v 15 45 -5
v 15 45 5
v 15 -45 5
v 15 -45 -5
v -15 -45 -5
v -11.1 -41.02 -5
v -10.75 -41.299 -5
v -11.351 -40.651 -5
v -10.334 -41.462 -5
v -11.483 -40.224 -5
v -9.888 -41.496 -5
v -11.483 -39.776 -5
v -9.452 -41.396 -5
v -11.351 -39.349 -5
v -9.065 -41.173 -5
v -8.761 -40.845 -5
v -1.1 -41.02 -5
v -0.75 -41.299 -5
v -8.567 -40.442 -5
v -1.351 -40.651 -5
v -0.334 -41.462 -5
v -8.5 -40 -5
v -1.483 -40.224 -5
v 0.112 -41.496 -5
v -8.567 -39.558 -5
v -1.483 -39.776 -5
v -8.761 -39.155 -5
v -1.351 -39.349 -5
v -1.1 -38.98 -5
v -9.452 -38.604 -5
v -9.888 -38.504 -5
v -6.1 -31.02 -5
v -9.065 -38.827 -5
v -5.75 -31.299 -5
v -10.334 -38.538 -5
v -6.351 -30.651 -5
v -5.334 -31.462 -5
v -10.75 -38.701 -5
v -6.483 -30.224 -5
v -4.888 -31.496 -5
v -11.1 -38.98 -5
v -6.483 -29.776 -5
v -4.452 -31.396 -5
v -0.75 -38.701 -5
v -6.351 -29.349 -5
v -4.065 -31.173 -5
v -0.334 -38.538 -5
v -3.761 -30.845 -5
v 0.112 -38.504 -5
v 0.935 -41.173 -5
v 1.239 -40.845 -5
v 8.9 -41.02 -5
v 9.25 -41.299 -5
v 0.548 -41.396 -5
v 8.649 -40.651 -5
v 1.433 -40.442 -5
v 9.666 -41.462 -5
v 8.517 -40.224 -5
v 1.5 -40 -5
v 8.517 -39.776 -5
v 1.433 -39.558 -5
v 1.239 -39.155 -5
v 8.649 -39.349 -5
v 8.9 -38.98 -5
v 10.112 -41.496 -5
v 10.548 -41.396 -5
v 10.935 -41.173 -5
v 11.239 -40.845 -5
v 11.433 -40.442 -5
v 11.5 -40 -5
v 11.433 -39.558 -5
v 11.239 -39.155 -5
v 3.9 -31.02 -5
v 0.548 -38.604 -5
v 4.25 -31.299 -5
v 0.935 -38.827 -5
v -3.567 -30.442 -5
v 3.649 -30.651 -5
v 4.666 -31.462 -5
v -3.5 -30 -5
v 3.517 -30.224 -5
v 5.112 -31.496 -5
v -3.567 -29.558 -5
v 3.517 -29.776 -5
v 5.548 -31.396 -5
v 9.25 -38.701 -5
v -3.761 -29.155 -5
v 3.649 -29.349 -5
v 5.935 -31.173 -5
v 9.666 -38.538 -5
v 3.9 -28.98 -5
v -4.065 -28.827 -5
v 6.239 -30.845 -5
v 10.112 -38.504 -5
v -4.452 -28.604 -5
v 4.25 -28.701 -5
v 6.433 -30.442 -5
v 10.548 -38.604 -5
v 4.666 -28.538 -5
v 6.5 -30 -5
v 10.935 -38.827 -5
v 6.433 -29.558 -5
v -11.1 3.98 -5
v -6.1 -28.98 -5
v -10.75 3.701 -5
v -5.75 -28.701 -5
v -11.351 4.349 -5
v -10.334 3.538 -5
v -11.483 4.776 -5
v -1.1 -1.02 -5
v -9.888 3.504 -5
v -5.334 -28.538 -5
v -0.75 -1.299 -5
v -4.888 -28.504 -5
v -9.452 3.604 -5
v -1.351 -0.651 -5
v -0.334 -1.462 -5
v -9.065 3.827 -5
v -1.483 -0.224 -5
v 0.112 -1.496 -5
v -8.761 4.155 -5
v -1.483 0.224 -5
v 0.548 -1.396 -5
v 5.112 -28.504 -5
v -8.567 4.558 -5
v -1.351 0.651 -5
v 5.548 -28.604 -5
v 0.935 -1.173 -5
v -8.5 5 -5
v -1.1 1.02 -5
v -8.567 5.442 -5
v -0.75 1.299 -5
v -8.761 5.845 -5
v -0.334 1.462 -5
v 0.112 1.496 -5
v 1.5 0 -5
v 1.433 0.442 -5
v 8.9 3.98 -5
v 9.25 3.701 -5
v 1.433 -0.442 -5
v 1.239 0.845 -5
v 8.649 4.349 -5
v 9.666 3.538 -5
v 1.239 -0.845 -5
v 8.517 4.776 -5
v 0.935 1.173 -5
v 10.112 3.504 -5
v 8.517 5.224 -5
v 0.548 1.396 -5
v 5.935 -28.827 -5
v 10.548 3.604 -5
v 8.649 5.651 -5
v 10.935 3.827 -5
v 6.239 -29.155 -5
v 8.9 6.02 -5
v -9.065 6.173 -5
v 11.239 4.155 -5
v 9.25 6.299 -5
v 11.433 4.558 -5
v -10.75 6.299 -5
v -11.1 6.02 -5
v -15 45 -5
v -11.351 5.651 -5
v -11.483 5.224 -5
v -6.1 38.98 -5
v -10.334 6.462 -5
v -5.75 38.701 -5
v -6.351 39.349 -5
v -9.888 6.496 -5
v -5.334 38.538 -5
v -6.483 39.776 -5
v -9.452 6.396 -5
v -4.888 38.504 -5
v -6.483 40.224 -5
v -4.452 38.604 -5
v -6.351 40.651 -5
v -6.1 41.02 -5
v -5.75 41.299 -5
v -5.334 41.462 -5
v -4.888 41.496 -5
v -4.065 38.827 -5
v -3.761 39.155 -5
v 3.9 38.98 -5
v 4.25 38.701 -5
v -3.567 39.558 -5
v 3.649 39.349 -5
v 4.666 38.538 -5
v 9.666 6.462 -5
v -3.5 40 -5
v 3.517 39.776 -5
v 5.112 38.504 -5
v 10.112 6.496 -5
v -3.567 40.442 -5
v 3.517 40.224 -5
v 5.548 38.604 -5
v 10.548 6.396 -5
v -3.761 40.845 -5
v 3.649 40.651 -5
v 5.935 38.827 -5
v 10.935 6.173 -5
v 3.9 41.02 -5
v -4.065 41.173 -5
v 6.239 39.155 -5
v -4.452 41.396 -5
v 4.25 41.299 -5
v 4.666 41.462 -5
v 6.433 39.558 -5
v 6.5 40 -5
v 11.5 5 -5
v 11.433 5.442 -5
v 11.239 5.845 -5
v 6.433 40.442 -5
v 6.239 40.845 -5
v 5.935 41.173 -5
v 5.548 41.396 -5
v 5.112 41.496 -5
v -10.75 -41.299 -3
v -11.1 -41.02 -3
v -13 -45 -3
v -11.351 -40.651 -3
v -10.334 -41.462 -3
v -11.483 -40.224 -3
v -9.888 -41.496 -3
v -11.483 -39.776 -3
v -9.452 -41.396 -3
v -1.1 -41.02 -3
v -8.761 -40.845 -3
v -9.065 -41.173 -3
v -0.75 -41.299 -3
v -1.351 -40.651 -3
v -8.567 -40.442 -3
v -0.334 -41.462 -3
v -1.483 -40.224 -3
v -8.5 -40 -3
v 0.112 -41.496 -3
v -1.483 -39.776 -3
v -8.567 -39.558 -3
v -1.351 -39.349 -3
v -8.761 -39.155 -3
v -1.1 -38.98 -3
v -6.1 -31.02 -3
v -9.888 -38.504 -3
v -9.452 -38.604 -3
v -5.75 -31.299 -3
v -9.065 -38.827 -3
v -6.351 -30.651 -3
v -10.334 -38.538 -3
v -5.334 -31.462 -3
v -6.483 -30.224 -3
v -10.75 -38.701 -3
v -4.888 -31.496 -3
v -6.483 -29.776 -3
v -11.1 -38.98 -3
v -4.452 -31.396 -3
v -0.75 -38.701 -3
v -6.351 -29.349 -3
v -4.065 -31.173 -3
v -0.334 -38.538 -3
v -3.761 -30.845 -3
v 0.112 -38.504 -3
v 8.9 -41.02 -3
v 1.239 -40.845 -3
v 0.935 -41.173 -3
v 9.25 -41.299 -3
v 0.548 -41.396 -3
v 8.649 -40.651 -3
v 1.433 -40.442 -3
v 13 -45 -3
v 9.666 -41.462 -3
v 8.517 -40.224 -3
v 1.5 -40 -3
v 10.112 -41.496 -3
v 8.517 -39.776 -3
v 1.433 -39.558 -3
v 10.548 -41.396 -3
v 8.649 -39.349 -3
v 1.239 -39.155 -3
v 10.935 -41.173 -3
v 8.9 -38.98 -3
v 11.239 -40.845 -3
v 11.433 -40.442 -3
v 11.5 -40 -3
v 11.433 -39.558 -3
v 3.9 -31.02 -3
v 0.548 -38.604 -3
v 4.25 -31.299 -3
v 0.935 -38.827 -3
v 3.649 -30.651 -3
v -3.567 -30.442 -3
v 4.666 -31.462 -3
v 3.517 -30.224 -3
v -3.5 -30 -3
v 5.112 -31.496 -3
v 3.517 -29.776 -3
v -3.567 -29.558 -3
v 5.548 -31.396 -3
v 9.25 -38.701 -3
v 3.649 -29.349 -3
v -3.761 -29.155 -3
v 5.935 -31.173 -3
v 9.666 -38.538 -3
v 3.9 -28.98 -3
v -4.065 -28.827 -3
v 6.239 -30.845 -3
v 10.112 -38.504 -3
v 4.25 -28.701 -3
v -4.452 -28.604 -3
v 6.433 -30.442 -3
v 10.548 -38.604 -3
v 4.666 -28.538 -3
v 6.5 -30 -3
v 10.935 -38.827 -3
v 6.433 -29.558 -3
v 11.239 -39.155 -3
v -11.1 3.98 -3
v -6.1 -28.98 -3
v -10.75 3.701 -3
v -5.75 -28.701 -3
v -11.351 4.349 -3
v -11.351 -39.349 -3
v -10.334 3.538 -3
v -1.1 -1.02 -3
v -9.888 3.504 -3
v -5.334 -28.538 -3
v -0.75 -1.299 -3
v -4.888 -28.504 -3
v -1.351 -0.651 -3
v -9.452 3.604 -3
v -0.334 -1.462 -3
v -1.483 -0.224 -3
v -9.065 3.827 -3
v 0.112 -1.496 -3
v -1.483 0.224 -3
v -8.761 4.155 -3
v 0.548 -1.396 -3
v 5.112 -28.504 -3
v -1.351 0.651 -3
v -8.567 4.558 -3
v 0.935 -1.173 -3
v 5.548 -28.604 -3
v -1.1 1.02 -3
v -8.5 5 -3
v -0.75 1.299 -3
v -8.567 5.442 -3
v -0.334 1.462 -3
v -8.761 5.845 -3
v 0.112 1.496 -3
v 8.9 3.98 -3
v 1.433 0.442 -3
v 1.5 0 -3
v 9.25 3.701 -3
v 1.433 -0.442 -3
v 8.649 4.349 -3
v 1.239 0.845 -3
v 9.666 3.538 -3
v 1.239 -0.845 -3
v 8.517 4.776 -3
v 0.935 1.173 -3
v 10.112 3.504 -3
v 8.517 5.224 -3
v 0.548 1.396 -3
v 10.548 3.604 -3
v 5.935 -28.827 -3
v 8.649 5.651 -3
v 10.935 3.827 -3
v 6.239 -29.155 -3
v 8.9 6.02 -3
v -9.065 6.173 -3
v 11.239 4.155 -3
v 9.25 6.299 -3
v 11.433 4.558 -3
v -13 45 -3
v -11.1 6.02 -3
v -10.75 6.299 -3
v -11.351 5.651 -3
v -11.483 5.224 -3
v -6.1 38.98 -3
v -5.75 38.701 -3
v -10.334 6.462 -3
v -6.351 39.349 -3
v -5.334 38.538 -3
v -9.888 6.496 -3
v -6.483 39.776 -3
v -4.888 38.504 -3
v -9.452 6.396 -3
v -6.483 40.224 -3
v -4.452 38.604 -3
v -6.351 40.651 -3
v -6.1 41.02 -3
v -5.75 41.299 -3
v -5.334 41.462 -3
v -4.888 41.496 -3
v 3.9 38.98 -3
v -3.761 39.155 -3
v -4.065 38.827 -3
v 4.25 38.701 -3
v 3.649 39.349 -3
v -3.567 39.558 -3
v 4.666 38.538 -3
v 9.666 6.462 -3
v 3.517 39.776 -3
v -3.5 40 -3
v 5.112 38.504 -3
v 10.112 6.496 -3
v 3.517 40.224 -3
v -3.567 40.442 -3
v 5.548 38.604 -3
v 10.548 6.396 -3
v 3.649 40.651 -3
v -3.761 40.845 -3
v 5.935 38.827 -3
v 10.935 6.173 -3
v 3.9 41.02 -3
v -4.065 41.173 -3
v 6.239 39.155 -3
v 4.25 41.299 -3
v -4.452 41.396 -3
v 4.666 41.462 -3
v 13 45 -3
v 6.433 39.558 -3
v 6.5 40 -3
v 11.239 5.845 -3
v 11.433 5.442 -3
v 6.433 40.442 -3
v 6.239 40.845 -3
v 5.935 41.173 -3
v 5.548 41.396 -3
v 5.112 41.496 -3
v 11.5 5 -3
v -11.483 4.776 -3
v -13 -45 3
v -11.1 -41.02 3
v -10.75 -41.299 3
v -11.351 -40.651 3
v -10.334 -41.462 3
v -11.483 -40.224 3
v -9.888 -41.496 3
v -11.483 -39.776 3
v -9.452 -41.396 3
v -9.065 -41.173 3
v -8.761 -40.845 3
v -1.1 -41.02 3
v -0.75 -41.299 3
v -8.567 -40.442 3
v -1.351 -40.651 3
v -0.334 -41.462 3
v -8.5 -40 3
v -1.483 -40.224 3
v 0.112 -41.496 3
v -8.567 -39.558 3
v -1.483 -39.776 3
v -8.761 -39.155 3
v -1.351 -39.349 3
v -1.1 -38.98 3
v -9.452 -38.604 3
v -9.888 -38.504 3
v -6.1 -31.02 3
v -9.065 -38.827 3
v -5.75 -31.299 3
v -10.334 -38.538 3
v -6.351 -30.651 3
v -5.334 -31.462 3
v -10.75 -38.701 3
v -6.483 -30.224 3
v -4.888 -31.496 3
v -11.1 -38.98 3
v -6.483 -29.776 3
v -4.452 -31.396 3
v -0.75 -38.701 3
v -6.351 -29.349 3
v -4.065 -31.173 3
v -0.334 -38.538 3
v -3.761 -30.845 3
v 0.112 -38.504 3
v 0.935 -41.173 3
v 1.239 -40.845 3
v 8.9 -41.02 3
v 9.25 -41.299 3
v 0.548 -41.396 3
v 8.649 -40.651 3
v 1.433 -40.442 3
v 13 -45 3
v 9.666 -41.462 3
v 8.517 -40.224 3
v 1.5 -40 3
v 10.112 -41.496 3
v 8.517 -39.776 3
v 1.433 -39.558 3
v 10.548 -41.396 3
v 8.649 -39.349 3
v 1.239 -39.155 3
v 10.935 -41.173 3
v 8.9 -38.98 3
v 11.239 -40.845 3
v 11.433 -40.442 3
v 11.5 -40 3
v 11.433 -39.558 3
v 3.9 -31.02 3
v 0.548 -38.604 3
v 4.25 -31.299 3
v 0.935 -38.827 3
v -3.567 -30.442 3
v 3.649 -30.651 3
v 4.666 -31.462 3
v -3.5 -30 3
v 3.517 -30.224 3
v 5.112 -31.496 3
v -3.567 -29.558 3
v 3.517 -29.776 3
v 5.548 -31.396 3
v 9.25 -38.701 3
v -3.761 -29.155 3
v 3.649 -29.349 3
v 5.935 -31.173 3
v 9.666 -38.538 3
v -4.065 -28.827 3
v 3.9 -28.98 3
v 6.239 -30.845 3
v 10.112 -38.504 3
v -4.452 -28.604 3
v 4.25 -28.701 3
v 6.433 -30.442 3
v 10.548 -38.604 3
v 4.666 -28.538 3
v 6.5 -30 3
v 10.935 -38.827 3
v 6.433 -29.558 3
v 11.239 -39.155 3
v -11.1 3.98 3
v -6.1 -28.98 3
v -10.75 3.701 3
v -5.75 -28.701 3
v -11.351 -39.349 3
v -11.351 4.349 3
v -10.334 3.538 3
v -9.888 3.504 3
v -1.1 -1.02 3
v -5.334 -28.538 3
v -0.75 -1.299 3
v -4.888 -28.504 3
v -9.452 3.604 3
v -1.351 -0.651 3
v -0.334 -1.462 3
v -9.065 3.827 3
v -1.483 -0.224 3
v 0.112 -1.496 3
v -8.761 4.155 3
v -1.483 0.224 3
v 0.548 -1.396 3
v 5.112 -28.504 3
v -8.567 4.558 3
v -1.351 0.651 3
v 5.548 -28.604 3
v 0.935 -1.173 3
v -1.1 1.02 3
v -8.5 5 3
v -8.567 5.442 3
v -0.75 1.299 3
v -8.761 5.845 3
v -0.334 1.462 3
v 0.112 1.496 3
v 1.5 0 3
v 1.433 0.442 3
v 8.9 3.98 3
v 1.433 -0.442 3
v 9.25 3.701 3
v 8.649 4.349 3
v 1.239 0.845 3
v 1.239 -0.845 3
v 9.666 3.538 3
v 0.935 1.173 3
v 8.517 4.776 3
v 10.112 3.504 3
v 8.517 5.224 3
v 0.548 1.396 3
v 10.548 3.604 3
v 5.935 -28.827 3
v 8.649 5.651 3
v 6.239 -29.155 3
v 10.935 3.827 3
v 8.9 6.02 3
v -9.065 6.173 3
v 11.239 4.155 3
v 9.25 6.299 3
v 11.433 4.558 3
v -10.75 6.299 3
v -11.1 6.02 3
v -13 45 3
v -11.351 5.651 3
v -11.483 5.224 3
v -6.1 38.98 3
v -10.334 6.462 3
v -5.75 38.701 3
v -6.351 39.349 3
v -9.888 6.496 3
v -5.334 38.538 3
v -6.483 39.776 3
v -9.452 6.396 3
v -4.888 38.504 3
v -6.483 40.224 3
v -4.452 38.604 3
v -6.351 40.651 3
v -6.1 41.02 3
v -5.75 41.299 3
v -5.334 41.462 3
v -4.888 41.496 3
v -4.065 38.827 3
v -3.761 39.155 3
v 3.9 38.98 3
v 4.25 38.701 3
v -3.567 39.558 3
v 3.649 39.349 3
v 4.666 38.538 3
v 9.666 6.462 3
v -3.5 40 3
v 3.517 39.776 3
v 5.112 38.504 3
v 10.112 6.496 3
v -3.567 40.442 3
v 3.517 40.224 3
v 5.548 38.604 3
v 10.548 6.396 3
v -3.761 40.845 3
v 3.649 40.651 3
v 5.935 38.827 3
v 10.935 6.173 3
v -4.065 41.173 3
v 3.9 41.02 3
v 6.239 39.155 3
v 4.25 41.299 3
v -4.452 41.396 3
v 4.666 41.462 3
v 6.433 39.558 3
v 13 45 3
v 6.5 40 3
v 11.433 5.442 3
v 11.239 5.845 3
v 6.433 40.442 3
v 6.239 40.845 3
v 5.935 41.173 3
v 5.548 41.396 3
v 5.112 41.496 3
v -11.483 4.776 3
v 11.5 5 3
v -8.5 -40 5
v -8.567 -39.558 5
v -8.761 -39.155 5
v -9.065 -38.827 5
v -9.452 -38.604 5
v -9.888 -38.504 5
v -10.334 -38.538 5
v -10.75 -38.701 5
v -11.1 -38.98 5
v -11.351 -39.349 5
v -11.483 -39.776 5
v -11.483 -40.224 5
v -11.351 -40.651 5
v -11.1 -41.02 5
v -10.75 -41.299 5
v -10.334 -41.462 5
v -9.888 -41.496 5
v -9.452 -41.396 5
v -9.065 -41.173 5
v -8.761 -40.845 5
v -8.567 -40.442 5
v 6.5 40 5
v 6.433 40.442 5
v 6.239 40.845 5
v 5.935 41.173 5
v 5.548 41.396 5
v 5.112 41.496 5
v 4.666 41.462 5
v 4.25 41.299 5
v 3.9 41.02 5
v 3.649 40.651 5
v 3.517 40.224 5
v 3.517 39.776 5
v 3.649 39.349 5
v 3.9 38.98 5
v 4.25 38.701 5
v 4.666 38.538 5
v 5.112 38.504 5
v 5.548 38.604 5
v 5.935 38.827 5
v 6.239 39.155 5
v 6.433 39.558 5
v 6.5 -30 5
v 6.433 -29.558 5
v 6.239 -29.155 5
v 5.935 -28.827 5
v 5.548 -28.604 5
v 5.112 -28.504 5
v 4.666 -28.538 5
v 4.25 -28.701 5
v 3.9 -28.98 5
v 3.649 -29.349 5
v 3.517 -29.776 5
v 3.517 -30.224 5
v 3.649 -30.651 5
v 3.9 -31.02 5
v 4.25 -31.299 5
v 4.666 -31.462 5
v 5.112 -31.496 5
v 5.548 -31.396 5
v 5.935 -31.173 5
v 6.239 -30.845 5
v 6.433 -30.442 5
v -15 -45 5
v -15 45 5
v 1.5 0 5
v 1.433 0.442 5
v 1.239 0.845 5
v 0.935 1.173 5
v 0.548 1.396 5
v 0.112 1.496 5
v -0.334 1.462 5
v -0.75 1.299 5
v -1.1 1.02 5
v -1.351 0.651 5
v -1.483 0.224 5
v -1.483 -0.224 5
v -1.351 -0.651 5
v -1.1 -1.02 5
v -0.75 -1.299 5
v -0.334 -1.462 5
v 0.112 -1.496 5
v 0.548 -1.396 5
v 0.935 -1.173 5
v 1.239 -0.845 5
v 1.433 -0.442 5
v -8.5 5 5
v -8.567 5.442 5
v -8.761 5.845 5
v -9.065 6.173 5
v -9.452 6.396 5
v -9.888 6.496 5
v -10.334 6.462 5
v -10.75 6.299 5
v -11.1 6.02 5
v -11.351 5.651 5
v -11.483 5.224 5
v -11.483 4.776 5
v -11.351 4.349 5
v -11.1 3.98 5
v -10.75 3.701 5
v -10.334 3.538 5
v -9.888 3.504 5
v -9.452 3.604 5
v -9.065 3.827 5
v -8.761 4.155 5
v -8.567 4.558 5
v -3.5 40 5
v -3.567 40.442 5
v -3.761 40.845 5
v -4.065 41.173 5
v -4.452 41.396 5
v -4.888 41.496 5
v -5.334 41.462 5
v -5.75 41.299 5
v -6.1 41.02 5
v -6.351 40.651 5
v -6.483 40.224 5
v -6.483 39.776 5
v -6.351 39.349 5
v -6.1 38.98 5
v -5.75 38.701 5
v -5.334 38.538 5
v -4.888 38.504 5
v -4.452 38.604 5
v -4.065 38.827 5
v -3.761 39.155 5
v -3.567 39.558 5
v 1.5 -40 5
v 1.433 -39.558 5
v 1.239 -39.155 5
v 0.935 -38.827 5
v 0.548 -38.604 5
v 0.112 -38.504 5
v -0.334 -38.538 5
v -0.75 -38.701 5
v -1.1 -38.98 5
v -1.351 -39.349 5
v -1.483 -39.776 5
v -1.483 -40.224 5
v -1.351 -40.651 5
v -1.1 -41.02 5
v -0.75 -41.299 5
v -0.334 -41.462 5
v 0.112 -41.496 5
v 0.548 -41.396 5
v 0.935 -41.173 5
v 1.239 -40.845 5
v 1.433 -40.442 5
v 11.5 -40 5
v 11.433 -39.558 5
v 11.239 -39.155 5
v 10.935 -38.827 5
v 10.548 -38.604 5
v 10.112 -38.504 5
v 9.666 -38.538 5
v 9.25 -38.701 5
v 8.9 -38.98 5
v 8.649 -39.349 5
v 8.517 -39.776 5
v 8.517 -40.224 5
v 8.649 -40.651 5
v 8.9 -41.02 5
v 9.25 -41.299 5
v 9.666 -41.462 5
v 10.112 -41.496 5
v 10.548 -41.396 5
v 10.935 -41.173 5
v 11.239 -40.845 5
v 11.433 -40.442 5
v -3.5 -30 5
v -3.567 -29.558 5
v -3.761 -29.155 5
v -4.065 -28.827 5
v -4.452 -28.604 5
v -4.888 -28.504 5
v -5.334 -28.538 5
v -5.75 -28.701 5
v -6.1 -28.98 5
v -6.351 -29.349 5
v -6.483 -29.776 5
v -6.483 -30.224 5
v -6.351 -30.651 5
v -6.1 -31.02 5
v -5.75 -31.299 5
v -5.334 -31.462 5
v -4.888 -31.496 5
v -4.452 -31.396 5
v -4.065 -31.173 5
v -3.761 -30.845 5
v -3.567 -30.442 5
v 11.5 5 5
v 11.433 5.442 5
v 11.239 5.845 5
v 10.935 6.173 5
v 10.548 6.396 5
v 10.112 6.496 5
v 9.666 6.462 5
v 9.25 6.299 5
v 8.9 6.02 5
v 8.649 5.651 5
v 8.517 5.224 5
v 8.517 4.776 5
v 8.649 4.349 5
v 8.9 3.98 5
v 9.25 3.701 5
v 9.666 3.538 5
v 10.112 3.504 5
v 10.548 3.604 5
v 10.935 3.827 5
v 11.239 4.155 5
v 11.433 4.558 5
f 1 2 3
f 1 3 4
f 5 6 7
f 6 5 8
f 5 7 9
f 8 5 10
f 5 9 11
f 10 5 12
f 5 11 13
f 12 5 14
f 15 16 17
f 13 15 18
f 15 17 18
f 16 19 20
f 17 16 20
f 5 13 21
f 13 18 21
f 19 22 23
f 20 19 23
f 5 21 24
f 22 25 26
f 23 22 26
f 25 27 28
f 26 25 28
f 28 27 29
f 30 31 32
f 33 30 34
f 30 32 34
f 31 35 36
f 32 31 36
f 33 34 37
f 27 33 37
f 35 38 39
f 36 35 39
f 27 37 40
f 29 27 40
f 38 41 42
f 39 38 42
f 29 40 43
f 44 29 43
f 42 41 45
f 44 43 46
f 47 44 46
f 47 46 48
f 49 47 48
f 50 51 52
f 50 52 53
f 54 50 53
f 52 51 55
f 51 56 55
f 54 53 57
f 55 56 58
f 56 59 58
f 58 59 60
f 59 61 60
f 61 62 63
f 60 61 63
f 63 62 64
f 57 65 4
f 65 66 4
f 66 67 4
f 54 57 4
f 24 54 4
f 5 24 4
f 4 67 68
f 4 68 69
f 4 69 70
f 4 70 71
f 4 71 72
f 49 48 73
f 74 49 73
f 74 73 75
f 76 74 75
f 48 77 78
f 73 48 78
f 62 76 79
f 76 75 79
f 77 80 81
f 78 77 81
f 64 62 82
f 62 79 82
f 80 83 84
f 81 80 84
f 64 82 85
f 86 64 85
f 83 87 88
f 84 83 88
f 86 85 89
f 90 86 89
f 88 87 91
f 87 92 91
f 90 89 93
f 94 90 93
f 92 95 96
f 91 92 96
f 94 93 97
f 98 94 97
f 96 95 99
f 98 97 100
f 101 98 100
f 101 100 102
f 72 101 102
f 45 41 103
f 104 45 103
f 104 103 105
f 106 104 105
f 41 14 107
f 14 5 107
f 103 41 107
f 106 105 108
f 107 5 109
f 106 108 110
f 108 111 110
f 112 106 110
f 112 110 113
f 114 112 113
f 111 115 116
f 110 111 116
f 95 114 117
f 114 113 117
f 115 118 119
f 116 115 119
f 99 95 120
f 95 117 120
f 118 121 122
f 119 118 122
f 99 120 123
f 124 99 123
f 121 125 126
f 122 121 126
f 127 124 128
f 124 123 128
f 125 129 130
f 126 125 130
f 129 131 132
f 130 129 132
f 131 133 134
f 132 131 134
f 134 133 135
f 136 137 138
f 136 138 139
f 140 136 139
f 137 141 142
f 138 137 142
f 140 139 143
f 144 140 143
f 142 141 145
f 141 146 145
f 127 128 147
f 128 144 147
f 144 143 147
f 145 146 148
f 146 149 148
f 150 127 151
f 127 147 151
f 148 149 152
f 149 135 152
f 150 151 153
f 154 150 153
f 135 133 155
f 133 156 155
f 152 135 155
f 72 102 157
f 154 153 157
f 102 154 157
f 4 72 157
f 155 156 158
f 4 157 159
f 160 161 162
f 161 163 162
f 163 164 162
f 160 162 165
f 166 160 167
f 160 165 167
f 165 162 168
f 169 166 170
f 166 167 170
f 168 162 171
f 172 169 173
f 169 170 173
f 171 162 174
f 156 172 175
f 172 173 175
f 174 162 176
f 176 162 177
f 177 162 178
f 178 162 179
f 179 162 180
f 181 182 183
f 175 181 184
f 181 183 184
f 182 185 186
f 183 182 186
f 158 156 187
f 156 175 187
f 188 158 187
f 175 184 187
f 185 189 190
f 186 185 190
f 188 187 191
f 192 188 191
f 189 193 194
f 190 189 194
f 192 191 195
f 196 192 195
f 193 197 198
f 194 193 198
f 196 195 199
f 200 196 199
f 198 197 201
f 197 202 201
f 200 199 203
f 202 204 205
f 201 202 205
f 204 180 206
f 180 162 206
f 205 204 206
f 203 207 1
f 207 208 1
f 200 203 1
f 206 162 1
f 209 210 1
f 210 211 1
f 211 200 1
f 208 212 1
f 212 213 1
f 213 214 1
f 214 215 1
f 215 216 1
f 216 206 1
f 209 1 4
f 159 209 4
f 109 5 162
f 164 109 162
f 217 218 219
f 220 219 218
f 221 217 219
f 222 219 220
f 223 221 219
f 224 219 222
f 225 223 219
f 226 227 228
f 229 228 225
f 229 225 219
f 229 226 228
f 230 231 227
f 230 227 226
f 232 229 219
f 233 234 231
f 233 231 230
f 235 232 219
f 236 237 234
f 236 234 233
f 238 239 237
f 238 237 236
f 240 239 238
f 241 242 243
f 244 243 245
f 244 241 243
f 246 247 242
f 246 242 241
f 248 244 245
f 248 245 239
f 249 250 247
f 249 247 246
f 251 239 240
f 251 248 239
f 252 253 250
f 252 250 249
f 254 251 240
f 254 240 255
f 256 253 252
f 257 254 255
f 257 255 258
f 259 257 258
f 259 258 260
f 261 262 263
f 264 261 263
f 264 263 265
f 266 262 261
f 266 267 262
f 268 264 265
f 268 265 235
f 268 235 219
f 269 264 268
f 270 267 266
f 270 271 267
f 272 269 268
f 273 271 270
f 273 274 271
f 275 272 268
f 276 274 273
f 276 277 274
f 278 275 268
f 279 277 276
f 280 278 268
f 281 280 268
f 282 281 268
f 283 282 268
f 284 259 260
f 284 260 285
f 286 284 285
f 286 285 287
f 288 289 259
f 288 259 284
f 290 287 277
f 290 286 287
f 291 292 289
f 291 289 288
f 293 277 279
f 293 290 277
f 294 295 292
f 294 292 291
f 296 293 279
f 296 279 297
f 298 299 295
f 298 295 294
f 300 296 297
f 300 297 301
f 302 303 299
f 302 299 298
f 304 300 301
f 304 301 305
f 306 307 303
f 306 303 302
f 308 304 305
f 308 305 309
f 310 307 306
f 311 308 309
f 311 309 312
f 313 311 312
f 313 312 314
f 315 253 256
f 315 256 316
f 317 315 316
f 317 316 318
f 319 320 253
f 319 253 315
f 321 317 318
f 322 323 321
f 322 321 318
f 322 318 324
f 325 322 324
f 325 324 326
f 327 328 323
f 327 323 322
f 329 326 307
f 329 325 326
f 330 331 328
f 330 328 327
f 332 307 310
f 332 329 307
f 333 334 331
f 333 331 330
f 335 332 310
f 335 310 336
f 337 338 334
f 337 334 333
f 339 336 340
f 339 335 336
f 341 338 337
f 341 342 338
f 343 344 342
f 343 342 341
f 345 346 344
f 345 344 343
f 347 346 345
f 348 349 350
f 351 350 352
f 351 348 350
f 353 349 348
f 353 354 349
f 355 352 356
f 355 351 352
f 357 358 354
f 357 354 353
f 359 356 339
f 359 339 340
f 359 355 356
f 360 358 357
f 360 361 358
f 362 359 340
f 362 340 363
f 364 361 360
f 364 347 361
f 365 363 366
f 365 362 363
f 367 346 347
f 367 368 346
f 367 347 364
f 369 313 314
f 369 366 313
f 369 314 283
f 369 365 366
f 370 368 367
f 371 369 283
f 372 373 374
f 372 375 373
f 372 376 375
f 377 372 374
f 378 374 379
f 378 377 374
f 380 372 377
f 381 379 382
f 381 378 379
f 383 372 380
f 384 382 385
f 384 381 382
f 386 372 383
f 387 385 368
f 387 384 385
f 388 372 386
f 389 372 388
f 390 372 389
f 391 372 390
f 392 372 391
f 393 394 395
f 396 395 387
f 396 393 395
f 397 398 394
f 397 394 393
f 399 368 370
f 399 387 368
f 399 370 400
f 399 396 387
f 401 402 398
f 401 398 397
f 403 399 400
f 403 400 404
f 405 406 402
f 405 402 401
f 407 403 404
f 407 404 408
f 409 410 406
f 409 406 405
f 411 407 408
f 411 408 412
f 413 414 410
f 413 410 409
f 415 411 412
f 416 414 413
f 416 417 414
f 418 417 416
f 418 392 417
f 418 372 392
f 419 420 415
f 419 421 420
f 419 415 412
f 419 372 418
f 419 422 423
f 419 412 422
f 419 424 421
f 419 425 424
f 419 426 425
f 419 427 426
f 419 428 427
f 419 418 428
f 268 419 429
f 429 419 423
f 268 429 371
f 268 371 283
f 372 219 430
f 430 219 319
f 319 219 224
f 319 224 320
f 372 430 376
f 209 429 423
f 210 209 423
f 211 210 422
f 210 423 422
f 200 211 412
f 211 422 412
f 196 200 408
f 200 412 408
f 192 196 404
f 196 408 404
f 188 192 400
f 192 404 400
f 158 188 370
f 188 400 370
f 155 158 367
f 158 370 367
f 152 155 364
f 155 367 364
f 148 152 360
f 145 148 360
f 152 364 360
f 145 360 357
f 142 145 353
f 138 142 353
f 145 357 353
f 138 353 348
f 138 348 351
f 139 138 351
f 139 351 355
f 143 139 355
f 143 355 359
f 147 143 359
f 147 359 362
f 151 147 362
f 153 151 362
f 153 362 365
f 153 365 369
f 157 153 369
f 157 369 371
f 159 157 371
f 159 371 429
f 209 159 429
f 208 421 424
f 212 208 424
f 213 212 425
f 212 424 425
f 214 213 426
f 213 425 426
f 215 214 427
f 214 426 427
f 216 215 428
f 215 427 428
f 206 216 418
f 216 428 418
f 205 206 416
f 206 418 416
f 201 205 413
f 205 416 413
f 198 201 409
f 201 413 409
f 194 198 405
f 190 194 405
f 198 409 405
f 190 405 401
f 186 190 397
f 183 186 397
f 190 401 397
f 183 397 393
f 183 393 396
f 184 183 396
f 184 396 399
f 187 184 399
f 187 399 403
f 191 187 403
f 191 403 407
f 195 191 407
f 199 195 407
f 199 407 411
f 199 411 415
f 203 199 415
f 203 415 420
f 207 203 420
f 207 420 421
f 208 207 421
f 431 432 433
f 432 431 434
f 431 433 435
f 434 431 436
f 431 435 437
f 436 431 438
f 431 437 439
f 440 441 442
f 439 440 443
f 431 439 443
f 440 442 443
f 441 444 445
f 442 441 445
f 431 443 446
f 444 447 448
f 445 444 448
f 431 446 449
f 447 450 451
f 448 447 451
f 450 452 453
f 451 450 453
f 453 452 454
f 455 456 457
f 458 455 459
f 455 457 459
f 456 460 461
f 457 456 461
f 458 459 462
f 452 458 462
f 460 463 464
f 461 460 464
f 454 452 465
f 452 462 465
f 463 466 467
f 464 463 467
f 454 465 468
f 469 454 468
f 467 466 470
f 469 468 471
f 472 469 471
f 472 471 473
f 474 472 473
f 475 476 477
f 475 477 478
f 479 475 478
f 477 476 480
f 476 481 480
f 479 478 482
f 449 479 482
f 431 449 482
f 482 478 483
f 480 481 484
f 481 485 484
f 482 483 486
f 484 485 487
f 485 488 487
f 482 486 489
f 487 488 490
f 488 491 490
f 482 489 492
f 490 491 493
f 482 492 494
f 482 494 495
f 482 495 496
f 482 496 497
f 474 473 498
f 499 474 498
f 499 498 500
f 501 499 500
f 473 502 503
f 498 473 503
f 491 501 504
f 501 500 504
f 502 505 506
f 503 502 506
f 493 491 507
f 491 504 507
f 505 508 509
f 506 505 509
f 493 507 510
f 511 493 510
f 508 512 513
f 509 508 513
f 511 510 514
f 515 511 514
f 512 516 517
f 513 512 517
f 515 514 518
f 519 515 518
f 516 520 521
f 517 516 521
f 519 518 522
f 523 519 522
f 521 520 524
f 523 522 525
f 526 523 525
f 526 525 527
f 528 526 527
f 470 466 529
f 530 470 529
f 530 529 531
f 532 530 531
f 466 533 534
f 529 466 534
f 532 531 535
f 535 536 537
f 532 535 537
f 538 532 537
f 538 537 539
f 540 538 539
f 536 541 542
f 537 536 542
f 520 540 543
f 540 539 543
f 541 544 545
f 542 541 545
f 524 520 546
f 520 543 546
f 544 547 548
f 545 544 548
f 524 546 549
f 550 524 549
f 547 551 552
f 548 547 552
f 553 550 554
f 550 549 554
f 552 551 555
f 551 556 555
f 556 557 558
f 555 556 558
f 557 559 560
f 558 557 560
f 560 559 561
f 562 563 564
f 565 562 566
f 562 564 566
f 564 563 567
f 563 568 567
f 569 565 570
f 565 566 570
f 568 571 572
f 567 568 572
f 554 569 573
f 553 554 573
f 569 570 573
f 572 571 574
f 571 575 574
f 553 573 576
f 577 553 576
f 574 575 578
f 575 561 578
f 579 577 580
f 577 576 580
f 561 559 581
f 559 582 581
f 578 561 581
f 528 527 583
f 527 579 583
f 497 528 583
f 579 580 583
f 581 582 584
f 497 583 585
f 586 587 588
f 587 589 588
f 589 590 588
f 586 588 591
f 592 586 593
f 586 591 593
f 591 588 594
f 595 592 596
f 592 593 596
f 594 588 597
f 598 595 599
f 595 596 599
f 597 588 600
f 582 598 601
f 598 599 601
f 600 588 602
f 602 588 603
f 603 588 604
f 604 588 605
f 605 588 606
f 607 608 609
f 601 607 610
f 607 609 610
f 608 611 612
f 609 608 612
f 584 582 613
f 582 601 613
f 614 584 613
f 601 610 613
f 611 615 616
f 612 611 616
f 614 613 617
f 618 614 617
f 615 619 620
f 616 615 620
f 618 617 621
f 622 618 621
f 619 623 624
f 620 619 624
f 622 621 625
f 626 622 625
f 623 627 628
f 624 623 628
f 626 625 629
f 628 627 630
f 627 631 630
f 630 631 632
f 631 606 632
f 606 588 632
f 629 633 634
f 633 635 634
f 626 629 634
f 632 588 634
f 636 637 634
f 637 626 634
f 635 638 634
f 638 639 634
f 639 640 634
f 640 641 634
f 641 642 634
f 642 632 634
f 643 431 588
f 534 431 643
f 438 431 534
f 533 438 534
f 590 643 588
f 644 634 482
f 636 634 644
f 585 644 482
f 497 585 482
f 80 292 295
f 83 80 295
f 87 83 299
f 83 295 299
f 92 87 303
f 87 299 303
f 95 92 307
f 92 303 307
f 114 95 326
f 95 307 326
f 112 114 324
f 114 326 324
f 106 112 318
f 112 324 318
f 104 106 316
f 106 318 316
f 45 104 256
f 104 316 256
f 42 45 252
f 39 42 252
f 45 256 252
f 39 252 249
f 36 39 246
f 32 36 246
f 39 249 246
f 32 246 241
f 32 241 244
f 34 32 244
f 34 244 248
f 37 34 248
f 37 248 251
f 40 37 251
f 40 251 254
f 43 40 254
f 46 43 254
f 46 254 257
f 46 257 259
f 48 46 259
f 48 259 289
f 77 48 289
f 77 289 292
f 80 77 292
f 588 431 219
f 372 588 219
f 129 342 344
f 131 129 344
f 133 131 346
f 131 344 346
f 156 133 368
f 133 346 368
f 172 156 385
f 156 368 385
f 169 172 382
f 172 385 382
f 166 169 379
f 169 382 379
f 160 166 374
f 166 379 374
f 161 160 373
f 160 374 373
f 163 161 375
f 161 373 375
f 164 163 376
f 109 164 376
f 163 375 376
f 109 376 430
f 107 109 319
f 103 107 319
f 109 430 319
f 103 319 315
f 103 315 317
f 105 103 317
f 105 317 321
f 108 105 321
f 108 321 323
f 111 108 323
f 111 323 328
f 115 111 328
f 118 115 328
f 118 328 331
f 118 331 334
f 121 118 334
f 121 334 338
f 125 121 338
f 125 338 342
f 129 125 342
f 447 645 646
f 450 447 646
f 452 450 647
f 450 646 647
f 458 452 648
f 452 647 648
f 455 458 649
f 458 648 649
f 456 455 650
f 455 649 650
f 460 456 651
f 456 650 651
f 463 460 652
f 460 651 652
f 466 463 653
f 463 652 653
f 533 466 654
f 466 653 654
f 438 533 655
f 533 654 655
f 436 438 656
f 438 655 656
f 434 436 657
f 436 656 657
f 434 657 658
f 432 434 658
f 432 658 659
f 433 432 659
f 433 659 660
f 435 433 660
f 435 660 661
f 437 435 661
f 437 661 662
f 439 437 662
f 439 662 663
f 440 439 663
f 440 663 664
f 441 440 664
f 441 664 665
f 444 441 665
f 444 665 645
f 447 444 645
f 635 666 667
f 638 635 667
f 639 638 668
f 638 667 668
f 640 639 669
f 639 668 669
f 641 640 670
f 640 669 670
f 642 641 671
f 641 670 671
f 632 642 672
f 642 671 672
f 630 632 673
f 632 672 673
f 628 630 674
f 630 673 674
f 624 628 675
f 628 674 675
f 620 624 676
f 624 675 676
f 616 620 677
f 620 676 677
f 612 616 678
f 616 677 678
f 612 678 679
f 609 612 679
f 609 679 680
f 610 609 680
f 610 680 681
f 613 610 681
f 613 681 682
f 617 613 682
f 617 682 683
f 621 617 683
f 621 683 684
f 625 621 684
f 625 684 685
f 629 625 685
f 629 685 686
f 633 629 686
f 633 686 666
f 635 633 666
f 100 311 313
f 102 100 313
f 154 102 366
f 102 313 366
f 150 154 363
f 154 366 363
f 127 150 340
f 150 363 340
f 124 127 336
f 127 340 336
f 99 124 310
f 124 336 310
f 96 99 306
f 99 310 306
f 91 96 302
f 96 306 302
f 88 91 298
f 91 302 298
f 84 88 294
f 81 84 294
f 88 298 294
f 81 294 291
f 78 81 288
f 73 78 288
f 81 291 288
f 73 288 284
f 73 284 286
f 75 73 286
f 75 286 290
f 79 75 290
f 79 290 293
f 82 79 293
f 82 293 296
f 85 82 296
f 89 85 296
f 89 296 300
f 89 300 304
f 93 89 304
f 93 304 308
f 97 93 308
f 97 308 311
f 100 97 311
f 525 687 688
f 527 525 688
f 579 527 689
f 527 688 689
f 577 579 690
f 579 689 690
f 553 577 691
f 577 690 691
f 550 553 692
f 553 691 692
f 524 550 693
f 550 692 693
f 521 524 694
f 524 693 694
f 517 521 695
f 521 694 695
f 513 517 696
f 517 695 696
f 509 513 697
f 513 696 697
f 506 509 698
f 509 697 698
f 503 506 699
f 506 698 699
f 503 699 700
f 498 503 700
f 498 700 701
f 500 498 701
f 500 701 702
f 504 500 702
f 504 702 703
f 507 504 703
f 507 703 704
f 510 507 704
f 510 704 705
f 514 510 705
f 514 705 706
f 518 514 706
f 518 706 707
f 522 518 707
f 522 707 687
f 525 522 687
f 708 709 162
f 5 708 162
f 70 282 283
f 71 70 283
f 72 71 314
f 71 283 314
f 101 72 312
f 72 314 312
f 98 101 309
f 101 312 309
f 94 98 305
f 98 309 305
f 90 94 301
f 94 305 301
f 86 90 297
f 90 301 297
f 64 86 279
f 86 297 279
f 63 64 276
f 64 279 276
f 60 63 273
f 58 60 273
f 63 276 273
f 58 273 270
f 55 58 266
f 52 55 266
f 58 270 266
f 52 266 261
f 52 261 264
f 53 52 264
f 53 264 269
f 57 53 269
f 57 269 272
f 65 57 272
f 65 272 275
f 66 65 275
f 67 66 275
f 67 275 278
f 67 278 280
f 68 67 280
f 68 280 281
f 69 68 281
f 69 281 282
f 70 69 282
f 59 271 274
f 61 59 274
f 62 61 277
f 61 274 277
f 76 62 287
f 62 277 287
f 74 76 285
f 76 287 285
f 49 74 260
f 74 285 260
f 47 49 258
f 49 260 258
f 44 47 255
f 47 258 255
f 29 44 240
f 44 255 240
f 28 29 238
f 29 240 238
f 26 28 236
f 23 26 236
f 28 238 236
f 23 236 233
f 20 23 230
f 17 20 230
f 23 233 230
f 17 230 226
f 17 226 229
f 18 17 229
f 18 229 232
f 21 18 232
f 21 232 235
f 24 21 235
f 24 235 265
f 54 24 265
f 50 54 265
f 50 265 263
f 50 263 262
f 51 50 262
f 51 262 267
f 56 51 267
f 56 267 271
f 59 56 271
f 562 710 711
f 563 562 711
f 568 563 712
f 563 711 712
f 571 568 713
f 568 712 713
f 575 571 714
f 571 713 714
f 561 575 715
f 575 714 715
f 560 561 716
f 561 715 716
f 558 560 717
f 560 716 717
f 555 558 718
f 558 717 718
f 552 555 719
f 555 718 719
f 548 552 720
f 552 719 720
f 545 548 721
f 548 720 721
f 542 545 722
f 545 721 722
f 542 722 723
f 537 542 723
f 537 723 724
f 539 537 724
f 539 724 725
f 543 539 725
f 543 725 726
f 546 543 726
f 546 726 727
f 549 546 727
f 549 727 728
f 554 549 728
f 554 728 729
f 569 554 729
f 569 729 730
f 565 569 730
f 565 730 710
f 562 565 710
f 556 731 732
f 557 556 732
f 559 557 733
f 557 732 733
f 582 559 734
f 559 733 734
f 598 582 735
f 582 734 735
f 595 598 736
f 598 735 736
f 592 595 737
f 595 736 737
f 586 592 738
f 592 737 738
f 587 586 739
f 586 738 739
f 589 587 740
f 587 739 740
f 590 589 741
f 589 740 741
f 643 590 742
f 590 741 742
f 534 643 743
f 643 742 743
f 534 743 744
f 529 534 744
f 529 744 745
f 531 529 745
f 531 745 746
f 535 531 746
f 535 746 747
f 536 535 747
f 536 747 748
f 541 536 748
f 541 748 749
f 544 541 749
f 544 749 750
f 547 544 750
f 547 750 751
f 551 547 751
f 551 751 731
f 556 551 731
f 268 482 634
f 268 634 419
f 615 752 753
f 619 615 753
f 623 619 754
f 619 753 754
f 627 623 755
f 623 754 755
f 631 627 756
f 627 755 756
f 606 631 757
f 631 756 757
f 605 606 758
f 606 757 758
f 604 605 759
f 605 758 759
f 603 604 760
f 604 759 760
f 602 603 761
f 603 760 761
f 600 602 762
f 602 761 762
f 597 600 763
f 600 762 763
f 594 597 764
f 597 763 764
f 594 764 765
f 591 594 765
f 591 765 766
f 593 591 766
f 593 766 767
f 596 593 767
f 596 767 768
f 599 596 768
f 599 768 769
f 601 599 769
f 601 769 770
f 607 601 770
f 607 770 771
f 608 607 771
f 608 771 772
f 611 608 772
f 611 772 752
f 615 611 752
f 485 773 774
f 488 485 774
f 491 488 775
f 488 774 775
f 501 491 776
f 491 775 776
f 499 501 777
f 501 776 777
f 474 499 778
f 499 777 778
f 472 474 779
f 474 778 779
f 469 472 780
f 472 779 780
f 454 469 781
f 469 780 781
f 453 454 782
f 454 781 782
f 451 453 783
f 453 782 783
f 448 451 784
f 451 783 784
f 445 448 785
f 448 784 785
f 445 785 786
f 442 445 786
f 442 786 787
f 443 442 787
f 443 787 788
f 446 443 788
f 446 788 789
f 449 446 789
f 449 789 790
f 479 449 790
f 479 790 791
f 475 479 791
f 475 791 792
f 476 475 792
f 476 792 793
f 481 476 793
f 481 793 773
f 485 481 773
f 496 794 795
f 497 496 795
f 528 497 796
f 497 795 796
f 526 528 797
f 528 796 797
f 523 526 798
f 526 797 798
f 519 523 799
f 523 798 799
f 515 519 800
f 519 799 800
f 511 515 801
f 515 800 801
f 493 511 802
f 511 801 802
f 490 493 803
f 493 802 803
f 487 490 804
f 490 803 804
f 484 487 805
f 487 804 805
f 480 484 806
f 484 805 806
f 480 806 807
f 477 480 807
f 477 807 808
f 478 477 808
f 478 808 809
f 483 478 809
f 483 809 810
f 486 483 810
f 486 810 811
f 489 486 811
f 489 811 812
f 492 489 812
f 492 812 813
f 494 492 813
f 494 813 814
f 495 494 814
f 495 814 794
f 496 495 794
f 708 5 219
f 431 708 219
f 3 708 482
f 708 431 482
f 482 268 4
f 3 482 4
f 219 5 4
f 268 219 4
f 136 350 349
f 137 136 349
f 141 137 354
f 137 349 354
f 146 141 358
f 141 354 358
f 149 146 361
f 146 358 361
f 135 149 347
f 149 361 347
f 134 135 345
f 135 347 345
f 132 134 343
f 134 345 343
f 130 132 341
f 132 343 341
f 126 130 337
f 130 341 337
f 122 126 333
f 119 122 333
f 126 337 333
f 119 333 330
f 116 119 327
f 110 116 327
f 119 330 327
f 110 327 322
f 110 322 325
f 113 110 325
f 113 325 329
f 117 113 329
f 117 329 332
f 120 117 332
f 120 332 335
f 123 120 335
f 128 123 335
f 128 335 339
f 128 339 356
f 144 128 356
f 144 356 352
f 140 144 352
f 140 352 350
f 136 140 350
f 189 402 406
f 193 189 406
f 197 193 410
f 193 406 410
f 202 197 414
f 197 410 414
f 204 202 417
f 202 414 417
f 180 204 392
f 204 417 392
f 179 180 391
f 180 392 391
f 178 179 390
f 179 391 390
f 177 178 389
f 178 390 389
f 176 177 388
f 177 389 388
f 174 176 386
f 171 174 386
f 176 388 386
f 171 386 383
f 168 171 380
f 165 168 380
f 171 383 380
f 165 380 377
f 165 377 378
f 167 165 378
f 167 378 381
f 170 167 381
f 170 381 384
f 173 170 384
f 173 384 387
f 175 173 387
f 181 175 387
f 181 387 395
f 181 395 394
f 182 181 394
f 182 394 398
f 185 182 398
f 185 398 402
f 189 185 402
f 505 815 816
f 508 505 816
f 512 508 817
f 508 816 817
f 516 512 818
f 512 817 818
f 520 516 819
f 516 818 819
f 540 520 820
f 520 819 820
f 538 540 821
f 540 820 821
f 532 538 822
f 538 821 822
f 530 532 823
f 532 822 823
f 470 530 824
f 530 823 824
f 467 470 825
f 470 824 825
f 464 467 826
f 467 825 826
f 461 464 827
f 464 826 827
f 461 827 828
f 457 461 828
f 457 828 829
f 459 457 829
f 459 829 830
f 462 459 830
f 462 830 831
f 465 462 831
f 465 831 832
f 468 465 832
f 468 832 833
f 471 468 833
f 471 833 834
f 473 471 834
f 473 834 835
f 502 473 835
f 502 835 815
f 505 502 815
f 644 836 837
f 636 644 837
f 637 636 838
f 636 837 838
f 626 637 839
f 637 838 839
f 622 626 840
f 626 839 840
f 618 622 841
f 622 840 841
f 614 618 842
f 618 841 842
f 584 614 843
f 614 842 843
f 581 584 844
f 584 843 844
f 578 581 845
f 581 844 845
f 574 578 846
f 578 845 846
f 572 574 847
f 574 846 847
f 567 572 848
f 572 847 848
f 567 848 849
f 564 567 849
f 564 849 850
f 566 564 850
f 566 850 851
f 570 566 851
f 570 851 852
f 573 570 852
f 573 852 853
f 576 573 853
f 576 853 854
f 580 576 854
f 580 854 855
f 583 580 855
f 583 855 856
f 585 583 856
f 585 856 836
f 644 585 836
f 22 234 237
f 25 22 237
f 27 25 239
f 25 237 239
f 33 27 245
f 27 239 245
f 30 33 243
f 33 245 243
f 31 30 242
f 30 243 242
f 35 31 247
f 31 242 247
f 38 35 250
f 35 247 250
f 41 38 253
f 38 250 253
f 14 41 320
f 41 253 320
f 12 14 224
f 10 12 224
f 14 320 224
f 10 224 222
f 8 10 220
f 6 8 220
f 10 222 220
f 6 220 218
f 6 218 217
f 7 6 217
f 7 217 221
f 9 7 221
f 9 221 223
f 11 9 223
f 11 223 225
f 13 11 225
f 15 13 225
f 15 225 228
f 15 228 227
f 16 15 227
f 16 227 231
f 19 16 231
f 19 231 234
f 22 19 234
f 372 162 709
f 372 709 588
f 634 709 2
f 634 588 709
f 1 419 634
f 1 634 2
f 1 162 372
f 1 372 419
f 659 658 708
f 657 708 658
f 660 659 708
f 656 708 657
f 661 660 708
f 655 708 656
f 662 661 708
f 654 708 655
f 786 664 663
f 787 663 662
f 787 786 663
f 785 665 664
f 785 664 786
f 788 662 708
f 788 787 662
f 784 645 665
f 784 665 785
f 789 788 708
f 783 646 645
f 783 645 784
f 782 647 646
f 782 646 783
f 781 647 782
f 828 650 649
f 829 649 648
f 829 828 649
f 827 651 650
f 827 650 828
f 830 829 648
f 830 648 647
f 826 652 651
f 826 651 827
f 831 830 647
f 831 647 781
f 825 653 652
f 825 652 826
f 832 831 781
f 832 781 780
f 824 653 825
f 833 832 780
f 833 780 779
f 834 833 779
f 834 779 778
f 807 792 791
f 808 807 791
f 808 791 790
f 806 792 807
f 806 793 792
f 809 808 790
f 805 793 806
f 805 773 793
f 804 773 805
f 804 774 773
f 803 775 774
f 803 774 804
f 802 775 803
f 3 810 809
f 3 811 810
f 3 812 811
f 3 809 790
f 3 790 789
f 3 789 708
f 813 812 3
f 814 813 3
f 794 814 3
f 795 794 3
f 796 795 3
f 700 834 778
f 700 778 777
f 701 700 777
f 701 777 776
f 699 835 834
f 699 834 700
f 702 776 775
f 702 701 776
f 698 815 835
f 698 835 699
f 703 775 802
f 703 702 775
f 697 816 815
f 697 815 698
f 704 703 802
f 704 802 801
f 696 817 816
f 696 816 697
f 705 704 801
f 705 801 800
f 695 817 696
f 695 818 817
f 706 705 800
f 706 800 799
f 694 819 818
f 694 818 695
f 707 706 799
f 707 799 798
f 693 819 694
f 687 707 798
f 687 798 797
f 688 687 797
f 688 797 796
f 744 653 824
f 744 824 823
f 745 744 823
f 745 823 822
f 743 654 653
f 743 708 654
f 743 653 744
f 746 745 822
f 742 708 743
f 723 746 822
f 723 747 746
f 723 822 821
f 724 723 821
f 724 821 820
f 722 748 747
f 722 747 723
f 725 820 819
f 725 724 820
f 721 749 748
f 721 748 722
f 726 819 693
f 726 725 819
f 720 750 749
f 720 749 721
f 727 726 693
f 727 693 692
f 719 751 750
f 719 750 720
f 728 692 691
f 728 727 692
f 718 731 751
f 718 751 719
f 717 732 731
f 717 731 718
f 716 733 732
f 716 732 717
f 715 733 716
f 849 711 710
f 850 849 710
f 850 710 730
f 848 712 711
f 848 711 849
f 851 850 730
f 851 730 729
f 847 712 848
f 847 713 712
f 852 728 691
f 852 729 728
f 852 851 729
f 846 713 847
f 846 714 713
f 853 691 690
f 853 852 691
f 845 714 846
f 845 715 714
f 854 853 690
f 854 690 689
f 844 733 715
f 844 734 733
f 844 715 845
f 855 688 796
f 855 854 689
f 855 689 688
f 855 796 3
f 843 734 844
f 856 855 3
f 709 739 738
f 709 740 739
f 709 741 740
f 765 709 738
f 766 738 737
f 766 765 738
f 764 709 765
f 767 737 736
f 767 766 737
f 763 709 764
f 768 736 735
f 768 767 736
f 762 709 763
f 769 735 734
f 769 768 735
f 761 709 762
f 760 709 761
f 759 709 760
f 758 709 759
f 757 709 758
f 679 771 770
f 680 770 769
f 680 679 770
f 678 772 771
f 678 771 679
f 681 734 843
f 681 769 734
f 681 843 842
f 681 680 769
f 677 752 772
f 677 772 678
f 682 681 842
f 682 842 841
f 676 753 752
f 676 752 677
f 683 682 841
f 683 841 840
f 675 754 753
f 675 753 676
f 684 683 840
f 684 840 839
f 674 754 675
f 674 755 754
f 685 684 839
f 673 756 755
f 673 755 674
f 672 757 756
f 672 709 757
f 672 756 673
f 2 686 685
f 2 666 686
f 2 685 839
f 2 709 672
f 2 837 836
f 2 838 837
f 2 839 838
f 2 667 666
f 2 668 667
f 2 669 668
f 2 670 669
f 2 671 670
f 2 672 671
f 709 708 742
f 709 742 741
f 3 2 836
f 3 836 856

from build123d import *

# Parameters (mm, degrees)
SKETCH_1_W          = 30
SKETCH_1_H          = 10
SKETCH_1_W_2        = 26
SKETCH_1_H_2        = 6
EXTRUDE_1_DEPTH     = 45
SKETCH_2_R          = 1.5
CUT_EXTRUDE_1_DEPTH = 49.476798574


with BuildPart() as part:
    # 草图1 → 凸台-拉伸1 (new, symmetric)
    with BuildSketch(Plane(origin=(0, 0, 0), x_dir=(1, 0, 0), z_dir=(0, 1, 0))):
        Rectangle(SKETCH_1_W, SKETCH_1_H)
        Rectangle(SKETCH_1_W_2, SKETCH_1_H_2, mode=Mode.SUBTRACT)
    extrude(amount=EXTRUDE_1_DEPTH, both=True)

    # 草图2 → 切除-拉伸1 (cut, through all)
    with BuildSketch(Plane.XY.offset(5)):
        with Locations((5, 40)):
            Circle(SKETCH_2_R)
        with Locations((10, 5)):
            Circle(SKETCH_2_R)
        Circle(SKETCH_2_R)
        with Locations((-10, 5)):
            Circle(SKETCH_2_R)
        with Locations((-5, 40)):
            Circle(SKETCH_2_R)
        with Locations((5, -30)):
            Circle(SKETCH_2_R)
        with Locations((-5, -30)):
            Circle(SKETCH_2_R)
        with Locations((-10, -40)):
            Circle(SKETCH_2_R)
        with Locations((0, -40)):
            Circle(SKETCH_2_R)
        with Locations((10, -40)):
            Circle(SKETCH_2_R)
    extrude(amount=-CUT_EXTRUDE_1_DEPTH, mode=Mode.SUBTRACT)


solid = part.part
